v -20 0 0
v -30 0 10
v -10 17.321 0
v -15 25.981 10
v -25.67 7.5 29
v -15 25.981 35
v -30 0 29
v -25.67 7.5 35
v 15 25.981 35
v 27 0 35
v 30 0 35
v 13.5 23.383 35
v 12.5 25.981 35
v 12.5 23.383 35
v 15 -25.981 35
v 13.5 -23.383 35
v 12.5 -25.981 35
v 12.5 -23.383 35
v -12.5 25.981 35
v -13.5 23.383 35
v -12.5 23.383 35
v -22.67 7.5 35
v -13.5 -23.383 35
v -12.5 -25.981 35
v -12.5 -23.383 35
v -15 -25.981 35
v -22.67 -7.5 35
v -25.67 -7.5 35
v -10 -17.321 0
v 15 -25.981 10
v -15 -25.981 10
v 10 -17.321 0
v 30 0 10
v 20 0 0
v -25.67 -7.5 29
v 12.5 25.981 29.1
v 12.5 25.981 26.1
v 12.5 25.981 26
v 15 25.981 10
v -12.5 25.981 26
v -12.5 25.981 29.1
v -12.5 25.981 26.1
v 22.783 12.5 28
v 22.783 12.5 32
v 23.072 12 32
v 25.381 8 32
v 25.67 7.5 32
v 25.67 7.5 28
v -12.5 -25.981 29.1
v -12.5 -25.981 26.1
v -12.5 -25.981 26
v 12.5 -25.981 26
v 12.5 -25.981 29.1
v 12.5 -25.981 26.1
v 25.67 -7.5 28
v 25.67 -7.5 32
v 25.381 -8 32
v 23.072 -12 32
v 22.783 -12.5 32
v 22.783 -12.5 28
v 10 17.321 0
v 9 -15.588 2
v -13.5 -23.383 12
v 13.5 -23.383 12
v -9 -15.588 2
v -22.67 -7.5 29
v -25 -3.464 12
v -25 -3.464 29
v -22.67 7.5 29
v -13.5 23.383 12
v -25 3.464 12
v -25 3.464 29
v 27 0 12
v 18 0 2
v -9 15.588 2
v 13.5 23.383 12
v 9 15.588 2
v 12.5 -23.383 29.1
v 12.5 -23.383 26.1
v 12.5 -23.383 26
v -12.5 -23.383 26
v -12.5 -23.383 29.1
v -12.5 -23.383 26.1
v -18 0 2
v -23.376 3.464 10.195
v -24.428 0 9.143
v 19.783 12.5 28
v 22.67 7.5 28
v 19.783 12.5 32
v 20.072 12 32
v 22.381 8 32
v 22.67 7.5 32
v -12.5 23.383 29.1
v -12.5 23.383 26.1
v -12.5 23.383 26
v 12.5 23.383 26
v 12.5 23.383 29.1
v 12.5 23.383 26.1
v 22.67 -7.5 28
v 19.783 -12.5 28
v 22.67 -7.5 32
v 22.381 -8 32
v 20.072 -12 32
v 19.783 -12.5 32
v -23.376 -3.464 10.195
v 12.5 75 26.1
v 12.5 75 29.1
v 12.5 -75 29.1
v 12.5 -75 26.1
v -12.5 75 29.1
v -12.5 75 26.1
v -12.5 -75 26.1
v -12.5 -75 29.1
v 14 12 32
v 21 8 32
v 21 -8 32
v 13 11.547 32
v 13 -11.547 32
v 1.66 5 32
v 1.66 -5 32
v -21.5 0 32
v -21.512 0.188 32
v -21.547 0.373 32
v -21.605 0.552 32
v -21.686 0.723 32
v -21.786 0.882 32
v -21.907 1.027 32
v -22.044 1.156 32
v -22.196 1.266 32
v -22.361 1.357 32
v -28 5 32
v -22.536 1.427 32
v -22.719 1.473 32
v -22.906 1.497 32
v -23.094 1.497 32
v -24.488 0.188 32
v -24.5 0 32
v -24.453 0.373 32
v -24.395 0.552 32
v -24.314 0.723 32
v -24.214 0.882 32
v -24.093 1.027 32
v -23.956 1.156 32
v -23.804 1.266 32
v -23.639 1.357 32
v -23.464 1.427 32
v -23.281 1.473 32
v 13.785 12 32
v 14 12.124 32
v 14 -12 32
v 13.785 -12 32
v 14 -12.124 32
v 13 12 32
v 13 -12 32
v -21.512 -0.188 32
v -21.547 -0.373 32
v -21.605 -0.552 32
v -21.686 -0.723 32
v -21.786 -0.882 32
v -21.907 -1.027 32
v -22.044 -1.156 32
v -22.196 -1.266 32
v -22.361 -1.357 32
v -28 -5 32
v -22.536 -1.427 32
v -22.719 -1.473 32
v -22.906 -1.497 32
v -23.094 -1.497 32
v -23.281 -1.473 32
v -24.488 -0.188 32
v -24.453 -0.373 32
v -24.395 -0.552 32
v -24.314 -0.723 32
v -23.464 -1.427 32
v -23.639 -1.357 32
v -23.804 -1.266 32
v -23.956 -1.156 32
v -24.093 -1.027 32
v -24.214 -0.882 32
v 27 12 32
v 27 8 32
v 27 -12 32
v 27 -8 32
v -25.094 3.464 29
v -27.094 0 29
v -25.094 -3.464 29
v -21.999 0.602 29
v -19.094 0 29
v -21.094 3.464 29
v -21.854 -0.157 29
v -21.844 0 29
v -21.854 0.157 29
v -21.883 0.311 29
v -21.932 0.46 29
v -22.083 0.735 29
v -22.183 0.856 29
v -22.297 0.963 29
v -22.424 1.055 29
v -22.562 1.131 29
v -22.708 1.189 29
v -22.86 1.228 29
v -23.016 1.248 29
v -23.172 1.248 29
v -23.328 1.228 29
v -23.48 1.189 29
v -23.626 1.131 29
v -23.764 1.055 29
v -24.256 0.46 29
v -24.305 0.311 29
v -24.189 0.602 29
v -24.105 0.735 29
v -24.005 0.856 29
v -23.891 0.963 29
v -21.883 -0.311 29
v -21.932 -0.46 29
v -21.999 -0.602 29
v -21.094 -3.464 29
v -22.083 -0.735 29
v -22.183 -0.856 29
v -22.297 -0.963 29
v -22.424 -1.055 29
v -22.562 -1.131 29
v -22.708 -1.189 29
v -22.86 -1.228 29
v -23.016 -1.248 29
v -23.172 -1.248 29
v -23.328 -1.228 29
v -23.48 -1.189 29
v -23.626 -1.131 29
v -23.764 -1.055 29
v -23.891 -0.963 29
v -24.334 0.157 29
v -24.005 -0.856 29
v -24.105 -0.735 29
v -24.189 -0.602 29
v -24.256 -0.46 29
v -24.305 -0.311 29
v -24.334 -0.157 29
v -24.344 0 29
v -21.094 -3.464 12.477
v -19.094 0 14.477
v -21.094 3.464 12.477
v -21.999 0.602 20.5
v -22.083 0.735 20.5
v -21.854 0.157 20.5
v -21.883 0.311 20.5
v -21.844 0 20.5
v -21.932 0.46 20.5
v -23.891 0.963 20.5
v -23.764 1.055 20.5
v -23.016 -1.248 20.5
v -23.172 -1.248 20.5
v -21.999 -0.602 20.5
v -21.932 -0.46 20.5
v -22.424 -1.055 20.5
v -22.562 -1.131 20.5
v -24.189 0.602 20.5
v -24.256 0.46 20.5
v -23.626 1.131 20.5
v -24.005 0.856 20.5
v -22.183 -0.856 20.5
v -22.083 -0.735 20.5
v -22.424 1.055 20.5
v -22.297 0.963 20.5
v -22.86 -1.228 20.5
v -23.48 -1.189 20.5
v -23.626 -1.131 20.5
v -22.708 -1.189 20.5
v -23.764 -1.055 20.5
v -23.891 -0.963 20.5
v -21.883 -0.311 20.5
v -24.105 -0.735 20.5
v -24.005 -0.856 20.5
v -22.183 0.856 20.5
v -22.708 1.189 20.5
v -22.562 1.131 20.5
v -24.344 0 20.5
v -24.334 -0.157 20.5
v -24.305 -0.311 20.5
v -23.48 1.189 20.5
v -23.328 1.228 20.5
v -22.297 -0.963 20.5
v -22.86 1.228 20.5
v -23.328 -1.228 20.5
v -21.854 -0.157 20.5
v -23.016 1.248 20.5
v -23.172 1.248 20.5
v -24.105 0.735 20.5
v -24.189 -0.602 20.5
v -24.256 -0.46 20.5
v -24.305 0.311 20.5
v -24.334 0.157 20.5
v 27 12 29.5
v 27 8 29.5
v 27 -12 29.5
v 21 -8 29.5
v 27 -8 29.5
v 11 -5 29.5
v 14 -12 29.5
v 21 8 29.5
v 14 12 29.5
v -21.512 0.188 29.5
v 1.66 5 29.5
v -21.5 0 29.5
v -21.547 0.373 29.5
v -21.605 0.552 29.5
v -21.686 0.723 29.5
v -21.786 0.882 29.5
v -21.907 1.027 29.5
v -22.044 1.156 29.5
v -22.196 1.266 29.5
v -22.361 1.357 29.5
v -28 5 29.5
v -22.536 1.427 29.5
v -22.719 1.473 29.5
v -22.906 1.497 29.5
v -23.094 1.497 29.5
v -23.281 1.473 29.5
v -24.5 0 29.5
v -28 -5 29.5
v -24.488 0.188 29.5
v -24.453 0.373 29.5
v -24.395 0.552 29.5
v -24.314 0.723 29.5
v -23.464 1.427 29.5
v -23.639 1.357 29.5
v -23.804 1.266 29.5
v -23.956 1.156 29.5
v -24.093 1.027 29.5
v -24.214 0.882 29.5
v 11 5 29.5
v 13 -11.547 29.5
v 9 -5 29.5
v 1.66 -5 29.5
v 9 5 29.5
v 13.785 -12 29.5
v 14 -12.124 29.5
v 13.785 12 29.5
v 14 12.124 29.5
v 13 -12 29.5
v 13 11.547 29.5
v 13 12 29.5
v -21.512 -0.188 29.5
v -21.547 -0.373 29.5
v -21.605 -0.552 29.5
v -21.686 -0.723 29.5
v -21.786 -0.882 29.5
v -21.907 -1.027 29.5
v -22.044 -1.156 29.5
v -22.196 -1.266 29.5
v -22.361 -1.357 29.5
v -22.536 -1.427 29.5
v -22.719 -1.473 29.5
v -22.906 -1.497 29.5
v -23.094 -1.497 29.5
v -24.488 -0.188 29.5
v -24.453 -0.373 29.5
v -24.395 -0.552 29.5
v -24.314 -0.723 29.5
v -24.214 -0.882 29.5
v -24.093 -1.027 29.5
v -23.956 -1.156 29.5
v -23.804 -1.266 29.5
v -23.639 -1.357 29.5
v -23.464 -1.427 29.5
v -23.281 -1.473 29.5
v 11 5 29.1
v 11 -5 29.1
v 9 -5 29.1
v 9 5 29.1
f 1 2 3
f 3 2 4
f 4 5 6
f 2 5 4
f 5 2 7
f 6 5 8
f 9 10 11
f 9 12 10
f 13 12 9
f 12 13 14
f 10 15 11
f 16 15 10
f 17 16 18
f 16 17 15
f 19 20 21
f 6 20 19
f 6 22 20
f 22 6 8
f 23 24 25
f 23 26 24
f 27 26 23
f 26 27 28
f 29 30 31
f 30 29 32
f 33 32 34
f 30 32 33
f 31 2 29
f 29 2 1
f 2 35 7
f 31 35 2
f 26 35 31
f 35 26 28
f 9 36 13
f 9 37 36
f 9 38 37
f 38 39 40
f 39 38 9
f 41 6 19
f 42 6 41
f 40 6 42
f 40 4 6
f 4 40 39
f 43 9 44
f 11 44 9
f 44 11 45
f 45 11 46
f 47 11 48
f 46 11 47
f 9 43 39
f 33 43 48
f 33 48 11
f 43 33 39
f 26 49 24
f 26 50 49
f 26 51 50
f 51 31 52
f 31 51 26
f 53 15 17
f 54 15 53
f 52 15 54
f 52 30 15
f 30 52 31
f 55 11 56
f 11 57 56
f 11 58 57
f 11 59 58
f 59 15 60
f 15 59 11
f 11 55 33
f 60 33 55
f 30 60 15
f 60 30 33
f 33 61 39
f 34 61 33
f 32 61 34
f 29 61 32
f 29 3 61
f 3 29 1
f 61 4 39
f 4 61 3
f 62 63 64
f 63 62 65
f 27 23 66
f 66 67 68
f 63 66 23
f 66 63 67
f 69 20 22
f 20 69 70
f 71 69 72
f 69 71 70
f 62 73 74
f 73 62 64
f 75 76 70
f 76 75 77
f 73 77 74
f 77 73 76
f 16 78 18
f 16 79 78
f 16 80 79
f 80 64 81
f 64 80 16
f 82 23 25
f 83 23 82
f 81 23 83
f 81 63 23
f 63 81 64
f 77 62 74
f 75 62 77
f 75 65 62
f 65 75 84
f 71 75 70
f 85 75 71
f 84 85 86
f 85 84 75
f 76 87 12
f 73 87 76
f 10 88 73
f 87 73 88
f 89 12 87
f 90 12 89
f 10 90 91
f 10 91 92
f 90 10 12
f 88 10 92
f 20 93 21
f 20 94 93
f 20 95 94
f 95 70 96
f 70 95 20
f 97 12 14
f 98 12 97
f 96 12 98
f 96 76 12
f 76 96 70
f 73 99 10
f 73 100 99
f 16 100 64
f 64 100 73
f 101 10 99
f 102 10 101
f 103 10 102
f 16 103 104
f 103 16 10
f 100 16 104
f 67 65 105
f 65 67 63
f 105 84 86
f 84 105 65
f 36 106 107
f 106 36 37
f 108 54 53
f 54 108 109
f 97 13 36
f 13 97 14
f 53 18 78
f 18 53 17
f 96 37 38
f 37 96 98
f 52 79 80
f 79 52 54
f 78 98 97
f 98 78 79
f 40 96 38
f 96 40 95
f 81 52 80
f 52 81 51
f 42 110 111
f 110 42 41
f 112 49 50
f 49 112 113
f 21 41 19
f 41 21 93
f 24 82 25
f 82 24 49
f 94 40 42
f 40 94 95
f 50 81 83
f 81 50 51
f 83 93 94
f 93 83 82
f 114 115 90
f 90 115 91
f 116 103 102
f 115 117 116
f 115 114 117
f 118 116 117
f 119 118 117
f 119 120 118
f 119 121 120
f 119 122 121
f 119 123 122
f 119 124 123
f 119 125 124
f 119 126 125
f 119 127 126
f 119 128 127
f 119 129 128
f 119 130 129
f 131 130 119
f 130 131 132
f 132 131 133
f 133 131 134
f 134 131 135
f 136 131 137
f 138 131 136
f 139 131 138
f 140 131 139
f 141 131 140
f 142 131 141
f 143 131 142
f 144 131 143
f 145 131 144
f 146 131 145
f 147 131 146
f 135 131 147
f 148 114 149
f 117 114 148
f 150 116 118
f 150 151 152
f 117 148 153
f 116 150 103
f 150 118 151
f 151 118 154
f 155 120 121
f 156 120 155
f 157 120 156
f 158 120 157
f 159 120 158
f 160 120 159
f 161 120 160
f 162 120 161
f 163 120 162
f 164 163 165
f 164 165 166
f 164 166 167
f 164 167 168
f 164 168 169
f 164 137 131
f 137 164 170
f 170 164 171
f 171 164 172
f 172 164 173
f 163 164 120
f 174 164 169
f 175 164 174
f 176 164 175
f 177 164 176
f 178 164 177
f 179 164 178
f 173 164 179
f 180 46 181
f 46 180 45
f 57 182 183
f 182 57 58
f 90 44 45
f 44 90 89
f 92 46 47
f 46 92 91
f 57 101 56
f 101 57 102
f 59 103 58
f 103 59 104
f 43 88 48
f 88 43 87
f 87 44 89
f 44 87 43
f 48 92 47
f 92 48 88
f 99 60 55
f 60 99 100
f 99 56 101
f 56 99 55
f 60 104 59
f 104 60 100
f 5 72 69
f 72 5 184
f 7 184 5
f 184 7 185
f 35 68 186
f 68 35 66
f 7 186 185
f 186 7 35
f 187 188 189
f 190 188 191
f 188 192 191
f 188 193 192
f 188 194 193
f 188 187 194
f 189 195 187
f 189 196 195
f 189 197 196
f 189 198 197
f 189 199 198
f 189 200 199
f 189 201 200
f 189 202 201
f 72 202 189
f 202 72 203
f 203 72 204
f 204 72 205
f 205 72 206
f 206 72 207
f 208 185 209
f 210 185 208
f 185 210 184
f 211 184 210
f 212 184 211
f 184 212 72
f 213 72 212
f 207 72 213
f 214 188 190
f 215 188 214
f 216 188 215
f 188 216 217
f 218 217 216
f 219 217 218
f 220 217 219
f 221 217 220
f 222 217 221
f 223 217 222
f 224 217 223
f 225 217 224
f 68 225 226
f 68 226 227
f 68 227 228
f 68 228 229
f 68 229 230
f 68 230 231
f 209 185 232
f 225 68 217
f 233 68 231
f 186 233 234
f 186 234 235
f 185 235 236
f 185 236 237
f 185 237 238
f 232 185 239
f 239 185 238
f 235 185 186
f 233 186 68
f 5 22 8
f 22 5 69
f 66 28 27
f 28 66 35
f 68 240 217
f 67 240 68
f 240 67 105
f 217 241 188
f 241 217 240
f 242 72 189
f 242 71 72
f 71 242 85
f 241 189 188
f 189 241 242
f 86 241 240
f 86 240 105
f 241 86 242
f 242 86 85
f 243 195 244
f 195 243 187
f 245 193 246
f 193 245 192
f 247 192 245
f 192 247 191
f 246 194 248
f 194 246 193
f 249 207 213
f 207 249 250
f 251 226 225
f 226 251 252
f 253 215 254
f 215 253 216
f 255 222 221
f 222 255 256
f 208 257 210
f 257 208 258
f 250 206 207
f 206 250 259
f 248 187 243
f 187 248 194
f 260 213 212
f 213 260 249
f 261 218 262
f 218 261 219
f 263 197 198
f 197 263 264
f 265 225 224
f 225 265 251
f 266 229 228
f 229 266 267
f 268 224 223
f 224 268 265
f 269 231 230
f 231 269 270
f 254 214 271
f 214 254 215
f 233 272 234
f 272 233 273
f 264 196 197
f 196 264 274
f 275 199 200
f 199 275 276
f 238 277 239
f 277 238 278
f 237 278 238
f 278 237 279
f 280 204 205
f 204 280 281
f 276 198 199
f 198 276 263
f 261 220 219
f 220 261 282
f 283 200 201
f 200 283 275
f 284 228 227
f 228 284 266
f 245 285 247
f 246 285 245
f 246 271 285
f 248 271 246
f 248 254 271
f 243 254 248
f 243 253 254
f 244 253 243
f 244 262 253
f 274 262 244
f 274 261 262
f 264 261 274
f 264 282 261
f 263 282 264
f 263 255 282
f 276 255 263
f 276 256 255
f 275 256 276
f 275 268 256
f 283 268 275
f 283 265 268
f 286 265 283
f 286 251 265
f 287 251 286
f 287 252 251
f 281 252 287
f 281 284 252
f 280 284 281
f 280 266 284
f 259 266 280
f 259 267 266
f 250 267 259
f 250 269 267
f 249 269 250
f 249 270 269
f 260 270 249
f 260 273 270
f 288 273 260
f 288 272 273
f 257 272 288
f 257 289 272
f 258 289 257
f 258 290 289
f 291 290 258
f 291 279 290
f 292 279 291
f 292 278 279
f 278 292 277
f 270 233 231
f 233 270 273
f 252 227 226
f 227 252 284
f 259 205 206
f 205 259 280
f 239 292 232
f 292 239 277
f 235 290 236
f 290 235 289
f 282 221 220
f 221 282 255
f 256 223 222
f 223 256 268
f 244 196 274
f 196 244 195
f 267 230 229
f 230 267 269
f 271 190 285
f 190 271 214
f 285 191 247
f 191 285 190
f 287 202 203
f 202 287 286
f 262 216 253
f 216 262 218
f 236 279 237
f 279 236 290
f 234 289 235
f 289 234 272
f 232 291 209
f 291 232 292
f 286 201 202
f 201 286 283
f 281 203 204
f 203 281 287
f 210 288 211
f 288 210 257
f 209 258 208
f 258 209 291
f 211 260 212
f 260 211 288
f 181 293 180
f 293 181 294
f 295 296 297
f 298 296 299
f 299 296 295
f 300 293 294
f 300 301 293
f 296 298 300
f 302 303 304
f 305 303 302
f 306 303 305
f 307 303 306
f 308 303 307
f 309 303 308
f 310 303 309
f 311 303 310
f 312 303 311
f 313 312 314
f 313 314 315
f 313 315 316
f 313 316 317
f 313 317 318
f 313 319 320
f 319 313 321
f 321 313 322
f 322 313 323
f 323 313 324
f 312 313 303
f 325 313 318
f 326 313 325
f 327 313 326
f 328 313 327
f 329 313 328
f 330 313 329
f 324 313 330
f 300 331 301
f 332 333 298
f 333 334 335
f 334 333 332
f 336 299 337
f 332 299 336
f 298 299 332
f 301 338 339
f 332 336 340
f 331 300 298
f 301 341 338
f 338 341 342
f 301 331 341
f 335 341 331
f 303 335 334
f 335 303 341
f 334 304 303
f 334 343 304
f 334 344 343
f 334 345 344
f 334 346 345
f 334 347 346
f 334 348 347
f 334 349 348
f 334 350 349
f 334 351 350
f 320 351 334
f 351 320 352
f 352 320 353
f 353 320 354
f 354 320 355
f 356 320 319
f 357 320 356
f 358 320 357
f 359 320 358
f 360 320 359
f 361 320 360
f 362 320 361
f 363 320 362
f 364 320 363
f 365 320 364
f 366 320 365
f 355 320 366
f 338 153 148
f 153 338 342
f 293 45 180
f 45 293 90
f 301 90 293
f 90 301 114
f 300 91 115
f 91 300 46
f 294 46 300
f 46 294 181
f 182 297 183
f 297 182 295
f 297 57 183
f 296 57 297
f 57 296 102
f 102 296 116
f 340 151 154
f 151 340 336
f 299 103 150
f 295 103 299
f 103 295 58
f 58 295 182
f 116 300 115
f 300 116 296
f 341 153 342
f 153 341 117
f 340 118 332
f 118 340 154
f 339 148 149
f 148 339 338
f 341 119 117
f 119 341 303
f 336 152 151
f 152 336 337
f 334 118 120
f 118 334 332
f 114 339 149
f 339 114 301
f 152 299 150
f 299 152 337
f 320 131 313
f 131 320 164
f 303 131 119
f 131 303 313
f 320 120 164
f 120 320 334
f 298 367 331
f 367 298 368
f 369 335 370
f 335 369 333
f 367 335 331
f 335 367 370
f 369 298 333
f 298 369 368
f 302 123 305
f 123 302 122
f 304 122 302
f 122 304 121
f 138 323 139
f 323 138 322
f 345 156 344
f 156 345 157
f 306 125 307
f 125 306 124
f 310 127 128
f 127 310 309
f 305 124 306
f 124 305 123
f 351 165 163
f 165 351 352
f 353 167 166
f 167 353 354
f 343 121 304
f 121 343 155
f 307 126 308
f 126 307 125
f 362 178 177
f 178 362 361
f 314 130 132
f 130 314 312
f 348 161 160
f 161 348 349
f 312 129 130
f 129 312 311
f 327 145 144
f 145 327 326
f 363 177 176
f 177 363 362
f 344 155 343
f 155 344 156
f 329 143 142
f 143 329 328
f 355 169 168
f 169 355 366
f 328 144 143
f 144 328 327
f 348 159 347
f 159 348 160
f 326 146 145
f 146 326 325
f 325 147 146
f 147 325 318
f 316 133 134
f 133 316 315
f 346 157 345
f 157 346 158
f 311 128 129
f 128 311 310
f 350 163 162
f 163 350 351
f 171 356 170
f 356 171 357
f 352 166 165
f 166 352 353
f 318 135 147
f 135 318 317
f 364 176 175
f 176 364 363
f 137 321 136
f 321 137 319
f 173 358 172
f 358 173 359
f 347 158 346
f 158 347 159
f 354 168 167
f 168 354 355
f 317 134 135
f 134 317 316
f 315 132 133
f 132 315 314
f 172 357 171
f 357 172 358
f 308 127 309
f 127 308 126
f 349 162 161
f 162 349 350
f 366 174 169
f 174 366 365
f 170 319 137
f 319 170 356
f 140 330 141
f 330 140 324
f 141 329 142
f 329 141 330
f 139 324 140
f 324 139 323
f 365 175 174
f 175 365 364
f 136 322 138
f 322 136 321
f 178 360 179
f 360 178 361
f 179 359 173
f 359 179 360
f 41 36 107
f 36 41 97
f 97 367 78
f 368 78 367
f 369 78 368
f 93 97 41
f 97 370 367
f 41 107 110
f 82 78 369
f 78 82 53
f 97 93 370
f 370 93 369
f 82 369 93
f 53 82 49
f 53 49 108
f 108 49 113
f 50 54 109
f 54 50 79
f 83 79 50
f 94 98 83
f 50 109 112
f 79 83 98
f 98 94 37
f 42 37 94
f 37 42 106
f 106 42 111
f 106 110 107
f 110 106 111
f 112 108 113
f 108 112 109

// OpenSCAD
$fn=50;

MAIN_RD = 20;

module main_shape(){
    hull(){   
        cylinder(h = 1, r = MAIN_RD, $fn=6);
        translate([0, 0, 10]){
            cylinder(h = 25, r = 30,$fn=6);
        }
    }
}

// the shell
union(){
    difference(){
        difference(){
            main_shape();
            translate([0, 0, 2]){
                scale([0.9,0.9,1.0]){
                    main_shape();
                }
            }
        }
        // chop out the bite for the Al bar
        translate([0, 0, 36]){
            cube([25, 80, 20], center=true);
        }
        // clamp holes
        CLAMP_HOLE_Z = 30;
        translate([23, 10, CLAMP_HOLE_Z]){
            cube([10 ,5 ,4 ], center=true);
        }
        translate([23, -10, CLAMP_HOLE_Z]){
            cube([10 ,5 ,4 ], center=true);
        }
    
    
        // clamp screw end bite
        translate([-20, 0, 34]){
            cube([22, 15, 10], center=true);
        }
    }
    
    // screw bollard
    cnr_rd = MAIN_RD * (1/cos(30));
    difference(){
        translate([-(cnr_rd), 0, 9]){
            cylinder(h = 20, r = 8/2, $fn=6);
        }
        // 45deg champfer for printability
        translate([-20, 0, 6.5]){
            rotate([0, 45, 0]){
                cube([10, 10,20 ], center=true);
            }
        }
        // screw hole
        translate([-cnr_rd, 0, 20.5]){
            cylinder(h = 10, r = 2.5/2);
        }
    
        
    }
}


//  CLAMP
CLAMP_TN = 2.5;
CLAMP_Z = 30.75;
difference(){
    
    union(){
        translate([22, 10, CLAMP_Z]){
            cube([10, 4, CLAMP_TN], center=true);
        }
        translate([22, -10, CLAMP_Z]){
            cube([10, 4, CLAMP_TN], center=true);
        }
        translate([17, 0, CLAMP_Z]){
            cube([8, 24, CLAMP_TN], center=true);
        }
        translate([7.0, 0, CLAMP_Z - CLAMP_TN/2]){
            rotate([0, 0, 60]){
                cylinder(h = CLAMP_TN, r = 14, $fn=3);
            }
        }
        translate([-13, 0, CLAMP_Z]){
            cube([30, 10, CLAMP_TN], center=true);
        }

        translate([10, 0, CLAMP_Z - 0.5]){
            cube([2, 10, CLAMP_TN], center=true);
        }

    }

    #translate([-23, 0, CLAMP_Z-2]){
        cylinder(h = CLAMP_TN * 2 , r = 3/2);
    }
    
}

// UNPRINTED Al BAR
color("YELLOW",0.5){
    translate([0, 0, 27.6]){
        cube([25,150 ,3 ], center=true);
    }
}
